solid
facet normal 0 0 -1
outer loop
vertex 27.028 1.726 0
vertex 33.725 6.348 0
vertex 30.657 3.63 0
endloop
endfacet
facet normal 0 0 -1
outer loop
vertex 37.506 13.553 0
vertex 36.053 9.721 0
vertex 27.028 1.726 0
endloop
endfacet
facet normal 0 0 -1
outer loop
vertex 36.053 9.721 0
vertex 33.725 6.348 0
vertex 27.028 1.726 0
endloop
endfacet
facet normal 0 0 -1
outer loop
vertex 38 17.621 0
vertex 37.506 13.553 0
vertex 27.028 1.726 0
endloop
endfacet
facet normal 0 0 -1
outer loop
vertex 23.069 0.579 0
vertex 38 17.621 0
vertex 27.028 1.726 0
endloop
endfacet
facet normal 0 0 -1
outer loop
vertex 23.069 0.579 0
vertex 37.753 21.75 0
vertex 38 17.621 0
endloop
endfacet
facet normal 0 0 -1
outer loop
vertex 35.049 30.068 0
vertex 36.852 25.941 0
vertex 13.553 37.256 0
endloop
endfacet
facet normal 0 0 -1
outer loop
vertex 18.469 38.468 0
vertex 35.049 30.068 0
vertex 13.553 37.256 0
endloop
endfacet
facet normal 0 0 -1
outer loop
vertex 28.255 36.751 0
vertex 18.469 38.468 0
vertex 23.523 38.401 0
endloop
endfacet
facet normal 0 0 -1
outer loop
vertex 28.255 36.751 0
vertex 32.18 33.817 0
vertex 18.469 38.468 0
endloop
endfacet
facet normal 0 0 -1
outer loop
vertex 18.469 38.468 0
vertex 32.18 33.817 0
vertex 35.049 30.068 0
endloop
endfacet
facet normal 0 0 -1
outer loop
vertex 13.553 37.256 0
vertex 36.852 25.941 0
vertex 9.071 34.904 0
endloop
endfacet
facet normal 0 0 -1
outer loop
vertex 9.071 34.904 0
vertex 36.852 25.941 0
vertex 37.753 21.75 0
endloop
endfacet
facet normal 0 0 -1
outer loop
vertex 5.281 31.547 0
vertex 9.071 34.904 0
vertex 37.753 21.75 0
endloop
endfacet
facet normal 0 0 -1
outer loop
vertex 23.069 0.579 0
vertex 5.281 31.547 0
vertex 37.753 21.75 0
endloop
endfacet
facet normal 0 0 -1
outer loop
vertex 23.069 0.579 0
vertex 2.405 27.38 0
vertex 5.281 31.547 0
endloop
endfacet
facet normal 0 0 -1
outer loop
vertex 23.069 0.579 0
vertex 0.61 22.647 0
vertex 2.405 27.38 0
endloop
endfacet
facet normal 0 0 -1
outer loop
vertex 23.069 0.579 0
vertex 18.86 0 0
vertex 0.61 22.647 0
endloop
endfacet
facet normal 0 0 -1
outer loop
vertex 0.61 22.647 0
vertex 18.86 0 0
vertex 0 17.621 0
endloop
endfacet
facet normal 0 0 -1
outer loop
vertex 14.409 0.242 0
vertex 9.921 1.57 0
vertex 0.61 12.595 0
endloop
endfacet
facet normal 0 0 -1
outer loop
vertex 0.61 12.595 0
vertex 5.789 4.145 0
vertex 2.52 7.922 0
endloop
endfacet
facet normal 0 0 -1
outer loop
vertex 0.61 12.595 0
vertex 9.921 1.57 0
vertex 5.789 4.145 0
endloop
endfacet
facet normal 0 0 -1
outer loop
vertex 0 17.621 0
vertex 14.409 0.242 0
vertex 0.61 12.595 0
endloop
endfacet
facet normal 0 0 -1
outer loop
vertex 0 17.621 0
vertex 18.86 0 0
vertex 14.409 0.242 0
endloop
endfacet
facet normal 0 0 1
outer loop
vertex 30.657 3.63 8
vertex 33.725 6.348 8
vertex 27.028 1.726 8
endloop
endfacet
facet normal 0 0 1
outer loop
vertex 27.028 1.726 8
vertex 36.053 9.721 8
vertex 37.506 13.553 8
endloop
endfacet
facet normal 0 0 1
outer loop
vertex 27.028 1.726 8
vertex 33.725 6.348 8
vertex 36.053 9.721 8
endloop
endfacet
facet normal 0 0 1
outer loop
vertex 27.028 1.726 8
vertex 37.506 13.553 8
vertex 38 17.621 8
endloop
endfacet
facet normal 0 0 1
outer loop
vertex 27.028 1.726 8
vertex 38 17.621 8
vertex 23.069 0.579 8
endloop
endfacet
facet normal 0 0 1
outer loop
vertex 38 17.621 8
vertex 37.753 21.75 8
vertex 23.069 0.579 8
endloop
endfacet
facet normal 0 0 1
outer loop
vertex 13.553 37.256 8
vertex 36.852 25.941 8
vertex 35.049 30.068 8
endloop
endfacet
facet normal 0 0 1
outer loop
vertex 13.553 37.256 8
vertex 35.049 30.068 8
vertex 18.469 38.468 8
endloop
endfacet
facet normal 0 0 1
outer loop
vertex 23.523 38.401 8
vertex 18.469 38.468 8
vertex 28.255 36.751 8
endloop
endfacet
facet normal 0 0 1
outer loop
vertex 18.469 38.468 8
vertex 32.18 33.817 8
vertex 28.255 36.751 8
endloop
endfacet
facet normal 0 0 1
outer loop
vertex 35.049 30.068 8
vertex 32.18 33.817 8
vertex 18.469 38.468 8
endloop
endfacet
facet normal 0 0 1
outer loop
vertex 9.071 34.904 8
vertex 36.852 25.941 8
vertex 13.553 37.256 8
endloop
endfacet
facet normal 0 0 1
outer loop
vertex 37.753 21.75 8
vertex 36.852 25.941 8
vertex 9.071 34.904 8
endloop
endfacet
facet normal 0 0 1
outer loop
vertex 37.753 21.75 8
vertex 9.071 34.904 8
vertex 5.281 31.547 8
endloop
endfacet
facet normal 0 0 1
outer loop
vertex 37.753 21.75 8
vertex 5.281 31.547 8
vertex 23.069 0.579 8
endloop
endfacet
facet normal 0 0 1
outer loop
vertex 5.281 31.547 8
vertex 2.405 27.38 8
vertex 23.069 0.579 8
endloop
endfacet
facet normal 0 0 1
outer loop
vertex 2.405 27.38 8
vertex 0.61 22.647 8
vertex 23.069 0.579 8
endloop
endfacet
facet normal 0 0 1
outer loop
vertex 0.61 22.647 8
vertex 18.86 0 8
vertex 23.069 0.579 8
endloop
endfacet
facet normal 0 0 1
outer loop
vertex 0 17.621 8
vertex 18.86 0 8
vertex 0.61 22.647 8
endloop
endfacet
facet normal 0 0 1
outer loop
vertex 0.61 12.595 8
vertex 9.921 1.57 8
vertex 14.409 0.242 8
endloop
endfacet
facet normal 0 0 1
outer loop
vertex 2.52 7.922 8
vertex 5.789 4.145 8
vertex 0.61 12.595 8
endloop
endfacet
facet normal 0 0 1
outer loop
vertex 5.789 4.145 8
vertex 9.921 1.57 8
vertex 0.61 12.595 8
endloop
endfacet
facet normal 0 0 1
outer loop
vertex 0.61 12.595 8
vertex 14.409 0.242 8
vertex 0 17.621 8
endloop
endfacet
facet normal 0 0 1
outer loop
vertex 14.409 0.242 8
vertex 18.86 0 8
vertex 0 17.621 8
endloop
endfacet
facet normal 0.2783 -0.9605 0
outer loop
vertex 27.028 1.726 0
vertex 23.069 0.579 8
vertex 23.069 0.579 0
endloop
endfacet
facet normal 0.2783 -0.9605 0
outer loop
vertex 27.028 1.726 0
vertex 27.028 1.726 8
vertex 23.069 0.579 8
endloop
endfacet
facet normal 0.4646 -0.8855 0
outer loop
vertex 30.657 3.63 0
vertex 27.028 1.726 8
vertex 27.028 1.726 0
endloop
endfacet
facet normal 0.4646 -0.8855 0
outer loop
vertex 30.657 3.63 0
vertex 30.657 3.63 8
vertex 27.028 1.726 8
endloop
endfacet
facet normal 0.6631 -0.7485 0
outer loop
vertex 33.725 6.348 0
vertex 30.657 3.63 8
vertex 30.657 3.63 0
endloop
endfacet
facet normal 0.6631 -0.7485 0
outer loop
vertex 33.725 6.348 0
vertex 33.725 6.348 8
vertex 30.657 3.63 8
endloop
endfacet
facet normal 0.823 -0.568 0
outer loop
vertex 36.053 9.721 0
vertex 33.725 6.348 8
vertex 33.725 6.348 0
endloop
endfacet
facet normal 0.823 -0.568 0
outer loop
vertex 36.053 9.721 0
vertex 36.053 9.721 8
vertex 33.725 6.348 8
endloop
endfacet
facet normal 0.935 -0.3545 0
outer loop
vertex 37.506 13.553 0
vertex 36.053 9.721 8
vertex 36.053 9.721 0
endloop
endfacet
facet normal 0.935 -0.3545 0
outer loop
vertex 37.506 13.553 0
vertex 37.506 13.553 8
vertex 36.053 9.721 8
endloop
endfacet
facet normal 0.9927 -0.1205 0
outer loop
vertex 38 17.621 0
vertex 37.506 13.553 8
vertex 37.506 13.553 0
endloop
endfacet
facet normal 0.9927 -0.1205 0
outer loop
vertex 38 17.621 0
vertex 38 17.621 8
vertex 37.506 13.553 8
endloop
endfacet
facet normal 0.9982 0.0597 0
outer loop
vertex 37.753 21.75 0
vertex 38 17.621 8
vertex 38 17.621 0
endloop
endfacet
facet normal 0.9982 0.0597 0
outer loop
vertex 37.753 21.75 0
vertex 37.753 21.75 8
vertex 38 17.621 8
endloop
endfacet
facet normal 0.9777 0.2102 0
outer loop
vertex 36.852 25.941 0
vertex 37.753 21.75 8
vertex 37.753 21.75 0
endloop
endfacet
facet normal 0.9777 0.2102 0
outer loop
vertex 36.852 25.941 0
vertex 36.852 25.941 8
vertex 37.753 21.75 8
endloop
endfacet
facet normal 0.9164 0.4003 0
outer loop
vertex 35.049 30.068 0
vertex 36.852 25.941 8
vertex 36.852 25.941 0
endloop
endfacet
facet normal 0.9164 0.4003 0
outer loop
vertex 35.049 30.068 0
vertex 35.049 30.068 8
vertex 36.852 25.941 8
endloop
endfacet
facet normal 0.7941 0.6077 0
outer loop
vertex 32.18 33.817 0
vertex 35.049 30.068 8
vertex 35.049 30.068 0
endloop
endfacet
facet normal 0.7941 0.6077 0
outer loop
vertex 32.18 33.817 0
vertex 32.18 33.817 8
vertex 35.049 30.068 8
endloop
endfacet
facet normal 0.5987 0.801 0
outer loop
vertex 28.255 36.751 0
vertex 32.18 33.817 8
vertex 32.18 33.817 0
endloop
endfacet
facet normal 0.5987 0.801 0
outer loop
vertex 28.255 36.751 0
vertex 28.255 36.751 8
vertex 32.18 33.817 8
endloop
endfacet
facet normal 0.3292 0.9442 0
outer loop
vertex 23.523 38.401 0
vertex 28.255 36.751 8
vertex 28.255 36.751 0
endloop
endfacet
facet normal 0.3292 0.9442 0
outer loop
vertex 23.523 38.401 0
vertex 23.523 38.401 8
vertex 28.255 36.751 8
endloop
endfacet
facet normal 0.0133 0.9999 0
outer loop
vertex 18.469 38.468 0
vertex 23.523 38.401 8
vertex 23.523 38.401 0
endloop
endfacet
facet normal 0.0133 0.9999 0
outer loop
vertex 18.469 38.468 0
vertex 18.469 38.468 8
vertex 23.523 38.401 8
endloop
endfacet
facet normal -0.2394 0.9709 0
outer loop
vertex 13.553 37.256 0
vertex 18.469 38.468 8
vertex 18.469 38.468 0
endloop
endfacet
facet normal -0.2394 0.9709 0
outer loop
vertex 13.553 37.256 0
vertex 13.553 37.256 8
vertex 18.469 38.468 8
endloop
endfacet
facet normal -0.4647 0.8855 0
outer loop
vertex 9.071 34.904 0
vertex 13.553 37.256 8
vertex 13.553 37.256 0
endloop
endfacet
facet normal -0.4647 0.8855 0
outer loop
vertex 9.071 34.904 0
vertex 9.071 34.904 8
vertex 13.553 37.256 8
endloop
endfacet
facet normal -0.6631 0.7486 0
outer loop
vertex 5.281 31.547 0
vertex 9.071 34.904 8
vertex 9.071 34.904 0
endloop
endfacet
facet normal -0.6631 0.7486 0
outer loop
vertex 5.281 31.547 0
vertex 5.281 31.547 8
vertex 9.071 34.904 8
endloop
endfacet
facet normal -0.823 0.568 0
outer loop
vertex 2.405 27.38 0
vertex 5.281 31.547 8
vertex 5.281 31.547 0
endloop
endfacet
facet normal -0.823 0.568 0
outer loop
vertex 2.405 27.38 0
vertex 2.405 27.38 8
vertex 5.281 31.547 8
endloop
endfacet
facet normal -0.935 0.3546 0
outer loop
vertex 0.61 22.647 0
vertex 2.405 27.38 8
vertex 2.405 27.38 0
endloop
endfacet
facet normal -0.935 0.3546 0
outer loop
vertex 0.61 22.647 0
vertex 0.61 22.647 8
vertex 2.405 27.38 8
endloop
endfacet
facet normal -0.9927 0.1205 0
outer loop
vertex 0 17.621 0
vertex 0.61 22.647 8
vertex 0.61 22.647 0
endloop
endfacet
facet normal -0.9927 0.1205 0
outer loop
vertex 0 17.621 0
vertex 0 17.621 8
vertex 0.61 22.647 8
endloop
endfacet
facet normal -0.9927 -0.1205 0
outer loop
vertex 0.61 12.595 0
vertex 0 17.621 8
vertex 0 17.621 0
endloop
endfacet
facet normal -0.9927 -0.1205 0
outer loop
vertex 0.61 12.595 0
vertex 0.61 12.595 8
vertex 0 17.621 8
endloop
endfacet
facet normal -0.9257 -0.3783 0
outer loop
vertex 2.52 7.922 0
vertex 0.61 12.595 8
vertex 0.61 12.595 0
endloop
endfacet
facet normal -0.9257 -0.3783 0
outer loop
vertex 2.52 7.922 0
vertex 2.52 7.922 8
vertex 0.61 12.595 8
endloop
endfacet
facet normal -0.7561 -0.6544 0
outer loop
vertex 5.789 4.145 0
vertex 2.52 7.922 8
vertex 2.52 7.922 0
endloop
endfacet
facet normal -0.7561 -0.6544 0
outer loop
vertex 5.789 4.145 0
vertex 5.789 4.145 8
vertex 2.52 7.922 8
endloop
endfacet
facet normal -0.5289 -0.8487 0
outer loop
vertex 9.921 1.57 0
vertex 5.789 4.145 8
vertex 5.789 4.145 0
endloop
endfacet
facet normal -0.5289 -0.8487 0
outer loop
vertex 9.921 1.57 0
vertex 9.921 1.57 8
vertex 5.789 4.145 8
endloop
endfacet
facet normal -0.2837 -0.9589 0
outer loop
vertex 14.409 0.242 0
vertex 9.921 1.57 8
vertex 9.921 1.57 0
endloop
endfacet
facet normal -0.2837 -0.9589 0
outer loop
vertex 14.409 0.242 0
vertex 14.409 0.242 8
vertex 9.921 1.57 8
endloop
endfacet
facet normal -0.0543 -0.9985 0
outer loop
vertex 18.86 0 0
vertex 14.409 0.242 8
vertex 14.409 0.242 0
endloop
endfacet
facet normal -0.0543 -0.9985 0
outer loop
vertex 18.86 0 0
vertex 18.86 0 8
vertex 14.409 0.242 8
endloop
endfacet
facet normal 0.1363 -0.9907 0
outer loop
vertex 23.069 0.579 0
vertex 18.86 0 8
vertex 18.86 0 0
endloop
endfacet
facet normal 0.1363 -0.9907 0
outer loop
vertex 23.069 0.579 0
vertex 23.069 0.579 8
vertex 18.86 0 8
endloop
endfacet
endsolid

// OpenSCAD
$fn = 32;

// ----------------------------------------------------------------------
// Cam disc: base radius 17.0 mm, lift 4.0 mm, 26 profile points
// ----------------------------------------------------------------------

// --- parameters (mm) ---
profile_height = 8;       // extrusion height
profile_points = 26;      // points of the closed outline

profile = [[38, 17.621], [37.753, 21.75], [36.852, 25.941], [35.049, 30.068], [32.18, 33.817], [28.255, 36.751], [23.523, 38.401], [18.469, 38.468], [13.553, 37.256], [9.071, 34.904], [5.281, 31.547], [2.405, 27.38], [0.61, 22.647], [0, 17.621], [0.61, 12.595], [2.52, 7.922], [5.789, 4.145], [9.921, 1.57], [14.409, 0.242], [18.86, 0], [23.069, 0.579], [27.028, 1.726], [30.657, 3.63], [33.725, 6.348], [36.053, 9.721], [37.506, 13.553]];  // single closed polygon, 26 points, counter clockwise

// --- the one profile operation ---
linear_extrude(height = profile_height) polygon(points = profile);
